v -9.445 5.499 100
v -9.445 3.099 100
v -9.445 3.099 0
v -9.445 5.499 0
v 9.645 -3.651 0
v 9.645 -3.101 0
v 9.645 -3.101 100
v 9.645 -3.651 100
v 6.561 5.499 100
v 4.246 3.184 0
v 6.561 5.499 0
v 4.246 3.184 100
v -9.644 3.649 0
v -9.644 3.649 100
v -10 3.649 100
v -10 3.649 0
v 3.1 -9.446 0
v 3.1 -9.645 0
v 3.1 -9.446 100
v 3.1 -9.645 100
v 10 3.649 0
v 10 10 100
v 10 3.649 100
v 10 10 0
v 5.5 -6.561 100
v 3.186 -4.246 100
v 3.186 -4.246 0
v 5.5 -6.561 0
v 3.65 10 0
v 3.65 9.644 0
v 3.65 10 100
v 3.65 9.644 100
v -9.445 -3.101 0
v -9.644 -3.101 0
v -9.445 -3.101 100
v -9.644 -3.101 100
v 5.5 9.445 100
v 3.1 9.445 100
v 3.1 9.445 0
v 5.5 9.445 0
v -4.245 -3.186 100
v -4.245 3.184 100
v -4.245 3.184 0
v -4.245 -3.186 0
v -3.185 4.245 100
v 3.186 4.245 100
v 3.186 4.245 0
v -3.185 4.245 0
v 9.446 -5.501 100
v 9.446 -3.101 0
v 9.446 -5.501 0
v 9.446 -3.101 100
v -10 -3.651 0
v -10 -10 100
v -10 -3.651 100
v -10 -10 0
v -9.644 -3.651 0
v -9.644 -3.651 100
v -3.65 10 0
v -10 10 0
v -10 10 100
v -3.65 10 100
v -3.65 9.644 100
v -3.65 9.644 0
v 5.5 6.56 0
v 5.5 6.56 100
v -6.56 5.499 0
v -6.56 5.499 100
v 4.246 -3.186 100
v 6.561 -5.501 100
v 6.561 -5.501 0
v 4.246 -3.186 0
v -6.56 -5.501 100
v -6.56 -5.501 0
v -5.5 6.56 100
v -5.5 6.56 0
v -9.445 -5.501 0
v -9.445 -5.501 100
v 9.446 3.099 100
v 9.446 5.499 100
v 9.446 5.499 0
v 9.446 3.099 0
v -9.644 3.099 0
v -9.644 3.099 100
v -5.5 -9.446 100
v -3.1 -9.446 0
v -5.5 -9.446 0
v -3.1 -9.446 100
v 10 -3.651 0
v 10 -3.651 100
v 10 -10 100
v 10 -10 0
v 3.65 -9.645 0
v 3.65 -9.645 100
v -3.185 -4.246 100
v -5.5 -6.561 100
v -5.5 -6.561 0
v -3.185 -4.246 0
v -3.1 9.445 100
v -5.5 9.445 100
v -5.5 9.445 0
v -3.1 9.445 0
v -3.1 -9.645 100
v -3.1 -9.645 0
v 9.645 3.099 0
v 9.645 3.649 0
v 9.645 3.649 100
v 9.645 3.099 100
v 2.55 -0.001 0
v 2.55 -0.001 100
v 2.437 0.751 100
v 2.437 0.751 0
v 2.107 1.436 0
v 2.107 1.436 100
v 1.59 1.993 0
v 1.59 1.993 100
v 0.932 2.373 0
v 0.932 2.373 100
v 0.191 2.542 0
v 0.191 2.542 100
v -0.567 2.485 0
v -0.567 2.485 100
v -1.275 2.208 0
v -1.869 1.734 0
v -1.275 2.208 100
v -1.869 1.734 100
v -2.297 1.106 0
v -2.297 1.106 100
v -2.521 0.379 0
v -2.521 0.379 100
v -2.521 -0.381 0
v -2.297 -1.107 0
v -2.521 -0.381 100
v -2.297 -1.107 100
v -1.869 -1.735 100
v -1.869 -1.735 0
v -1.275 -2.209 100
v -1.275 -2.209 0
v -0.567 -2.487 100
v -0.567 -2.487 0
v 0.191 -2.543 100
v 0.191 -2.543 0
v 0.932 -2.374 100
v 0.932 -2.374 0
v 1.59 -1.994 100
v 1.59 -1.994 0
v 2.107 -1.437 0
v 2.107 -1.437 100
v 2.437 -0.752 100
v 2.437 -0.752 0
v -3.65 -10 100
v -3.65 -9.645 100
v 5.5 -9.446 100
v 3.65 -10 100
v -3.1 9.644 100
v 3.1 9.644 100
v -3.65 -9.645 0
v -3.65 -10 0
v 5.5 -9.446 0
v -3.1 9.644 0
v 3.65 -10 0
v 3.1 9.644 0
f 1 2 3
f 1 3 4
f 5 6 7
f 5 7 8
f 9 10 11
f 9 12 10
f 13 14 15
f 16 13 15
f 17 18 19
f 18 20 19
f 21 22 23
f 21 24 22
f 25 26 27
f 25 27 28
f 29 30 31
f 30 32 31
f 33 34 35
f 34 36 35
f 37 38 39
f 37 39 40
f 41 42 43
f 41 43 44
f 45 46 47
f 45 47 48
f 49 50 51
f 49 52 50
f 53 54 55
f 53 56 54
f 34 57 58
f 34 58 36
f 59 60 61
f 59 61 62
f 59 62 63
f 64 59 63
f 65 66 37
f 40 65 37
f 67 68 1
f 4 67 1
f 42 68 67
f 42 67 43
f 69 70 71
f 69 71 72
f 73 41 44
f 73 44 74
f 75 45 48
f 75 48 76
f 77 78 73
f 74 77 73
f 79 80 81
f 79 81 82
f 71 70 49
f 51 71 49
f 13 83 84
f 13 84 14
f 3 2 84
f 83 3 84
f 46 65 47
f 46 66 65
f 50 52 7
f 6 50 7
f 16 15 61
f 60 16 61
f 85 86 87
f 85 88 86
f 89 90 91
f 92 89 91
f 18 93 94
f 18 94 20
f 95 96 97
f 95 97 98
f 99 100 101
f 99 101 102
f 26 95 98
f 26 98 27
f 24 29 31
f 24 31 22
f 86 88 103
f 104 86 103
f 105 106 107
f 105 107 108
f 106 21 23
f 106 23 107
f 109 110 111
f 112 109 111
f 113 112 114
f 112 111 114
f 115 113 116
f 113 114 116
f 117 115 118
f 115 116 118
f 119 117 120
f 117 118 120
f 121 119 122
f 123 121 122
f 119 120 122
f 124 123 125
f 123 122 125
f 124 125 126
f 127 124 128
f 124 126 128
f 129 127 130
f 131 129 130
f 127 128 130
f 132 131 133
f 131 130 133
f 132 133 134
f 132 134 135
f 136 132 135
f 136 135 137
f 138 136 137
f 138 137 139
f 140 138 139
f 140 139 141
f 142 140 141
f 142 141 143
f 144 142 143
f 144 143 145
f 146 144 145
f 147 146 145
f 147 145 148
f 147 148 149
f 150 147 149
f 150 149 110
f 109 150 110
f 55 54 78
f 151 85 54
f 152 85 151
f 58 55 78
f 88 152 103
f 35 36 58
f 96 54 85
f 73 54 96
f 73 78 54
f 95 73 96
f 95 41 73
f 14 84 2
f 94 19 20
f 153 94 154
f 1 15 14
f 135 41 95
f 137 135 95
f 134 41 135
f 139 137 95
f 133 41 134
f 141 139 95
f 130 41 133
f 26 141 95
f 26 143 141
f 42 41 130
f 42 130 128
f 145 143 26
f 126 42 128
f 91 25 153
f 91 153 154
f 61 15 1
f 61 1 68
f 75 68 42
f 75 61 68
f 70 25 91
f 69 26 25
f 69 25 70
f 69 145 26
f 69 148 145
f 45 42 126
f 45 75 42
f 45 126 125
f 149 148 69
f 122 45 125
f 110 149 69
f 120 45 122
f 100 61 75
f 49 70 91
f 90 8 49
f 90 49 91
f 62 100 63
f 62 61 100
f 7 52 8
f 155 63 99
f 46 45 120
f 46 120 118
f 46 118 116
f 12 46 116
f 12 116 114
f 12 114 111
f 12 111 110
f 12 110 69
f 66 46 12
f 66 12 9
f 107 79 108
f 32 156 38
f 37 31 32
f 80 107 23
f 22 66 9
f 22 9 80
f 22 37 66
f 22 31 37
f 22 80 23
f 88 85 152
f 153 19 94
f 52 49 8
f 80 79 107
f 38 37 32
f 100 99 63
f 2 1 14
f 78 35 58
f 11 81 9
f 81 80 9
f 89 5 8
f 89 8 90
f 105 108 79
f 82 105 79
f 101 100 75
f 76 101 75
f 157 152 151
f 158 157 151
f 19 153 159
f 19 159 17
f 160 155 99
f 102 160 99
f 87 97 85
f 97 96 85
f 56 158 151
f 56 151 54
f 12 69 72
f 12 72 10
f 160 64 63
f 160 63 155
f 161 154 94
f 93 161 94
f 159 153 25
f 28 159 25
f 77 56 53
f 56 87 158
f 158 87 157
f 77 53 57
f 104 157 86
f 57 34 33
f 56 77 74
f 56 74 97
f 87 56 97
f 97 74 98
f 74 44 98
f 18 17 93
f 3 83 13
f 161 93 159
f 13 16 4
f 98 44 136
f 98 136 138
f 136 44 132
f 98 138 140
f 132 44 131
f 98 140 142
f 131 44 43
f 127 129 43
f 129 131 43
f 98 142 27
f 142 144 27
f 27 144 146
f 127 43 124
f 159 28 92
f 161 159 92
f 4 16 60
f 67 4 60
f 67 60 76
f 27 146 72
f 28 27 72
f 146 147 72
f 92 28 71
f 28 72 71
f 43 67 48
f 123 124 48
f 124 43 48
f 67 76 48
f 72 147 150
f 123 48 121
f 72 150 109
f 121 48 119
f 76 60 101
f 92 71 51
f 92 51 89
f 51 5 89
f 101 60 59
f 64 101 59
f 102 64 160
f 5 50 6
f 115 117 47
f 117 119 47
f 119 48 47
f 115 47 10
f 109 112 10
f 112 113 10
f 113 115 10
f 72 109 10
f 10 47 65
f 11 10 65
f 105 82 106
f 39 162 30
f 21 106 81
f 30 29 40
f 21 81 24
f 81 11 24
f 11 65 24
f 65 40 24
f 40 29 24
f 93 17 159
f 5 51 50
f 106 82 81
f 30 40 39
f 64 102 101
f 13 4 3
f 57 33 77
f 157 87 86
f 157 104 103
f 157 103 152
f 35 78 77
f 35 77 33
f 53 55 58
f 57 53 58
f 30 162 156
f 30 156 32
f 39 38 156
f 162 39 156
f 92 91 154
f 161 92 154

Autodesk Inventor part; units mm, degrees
ref_plane "YZ Plane" through (0, 0, 0) normal (1, 0, 0) x (0, 1, 0)
ref_plane "XZ Plane" through (0, 0, 0) normal (0, 1, 0) x (-1, 0, 0)
ref_plane "XY Plane" through (0, 0, 0) normal (0, 0, 1) x (1, 0, 0)
sketch "草图1" plane through (0, 0, 0) normal (0, 0, 1) x (1, 0, 0)
  line L0 (10, -10) -> (-10, -10)
  line L1 (-10, -10) -> (-10, 10)
  line L2 (-10, 10) -> (10, 10)
  line L3 (10, 10) -> (10, -10)
  line L4 (10, -10) -> (-10, 10) construction
  line L5 (-10, -10) -> (10, 10) construction
  point P0 (0, 0)
  dimension "d0" = 20
  dimension "d1" = 20
extrude "拉伸1" add sketch "草图1" along normal blind 100
sketch "草图2" plane through (0, 0, 100) normal (0, 0, 1) x (1, 0, 0)
  line L0 (-10.3453, 3.6494) -> (-10.3453, 10.3451)
  line L1 (-10.3453, 3.0994) -> (-10.3453, 10.3451)
  line L2 (-10.3453, 10.3451) -> (-10.3453, -10.0013)
  line L3 (-10.3453, 5.4994) -> (-10.3453, 10.3451)
  line L4 (-3.6495, 9.6435) -> (-3.0995, 9.6435)
  line L5 (-5.4995, 12.01) -> (-5.4995, 5.4994)
  line L6 (-3.0995, 10.3451) -> (-3.0995, 9.4451)
  line L7 (-5.4995, 9.4451) -> (0.0005, 9.4451)
  line L8 (-3.6495, 10.3451) -> (-3.6495, 9.4451)
  circle A0 centre (0.0005, -0.0006) radius 2.55
  line L9 (-5.4995, 10.3451) -> (-5.4995, 5.4994)
  line L10 (-10.3453, 10.3451) -> (-5.4995, 10.3451)
  line L11 (-5.4995, 5.4994) -> (-10.3453, 5.4994)
  line L12 (-4.2453, 4.2451) -> (-4.2453, -0.0006)
  line L13 (-10.3453, 10.3451) -> (-3.6495, 10.3451)
  line L14 (-10.3453, 10.3451) -> (-3.0995, 10.3451)
  line L15 (-11.061, -0.0006) -> (0.0005, -0.0006)
  line L16 (-1.0602, -0.0006) -> (-10.3453, 9.2845)
  line L17 (-10.3453, 10.3451) -> (0.0005, -0.0006)
  line L18 (0.0005, 1.06) -> (-9.2846, 10.3451)
  line L19 (0.0005, -0.0006) -> (0.0005, 11.5494)
  line L20 (10.0005, 10.3451) -> (-10.3453, 10.3451)
  line L21 (0.0005, 4.2451) -> (-4.2453, 4.2451)
  point P0 (0, 0)
  point P1 (-3.0995, 9.8951)
  point P2 (-5.4995, 6.56)
  point P3 (-3.1846, 4.2451)
  point P4 (0.0005, 10.3451)
  point P5 (-3.0995, 10.3451)
  dimension "d4" = 5.1
  dimension "d5" = 6.1
  dimension "d6" = 1.5
  dimension "d7" = 5.5
  dimension "d8" = 0.9
  dimension "d9" = 3.1
  dimension "d10" = 3.65
extrude "拉伸2" cut sketch "草图2" against normal blind 205.75 contours L5 L7 L19 L21 L18 | L16 L15 A0 | A0 L17 L15 L16 | L15 L19 A0 | A0 L18 L19 L17 | L14 L6 L4 L8 | A0 L19 L18 | L20 L19 L7 L6
mirror "镜像1" about plane through (0.0005, 10.3451, 100) normal (-1, 0, 0) of "拉伸2"
pattern_circular "环形阵列1" count 4 over 360 about axis through (0.0005, -0.0006, 100) along (0, 0, -1) of "拉伸2", "镜像1"
properties part number "铝方管2020x60"
